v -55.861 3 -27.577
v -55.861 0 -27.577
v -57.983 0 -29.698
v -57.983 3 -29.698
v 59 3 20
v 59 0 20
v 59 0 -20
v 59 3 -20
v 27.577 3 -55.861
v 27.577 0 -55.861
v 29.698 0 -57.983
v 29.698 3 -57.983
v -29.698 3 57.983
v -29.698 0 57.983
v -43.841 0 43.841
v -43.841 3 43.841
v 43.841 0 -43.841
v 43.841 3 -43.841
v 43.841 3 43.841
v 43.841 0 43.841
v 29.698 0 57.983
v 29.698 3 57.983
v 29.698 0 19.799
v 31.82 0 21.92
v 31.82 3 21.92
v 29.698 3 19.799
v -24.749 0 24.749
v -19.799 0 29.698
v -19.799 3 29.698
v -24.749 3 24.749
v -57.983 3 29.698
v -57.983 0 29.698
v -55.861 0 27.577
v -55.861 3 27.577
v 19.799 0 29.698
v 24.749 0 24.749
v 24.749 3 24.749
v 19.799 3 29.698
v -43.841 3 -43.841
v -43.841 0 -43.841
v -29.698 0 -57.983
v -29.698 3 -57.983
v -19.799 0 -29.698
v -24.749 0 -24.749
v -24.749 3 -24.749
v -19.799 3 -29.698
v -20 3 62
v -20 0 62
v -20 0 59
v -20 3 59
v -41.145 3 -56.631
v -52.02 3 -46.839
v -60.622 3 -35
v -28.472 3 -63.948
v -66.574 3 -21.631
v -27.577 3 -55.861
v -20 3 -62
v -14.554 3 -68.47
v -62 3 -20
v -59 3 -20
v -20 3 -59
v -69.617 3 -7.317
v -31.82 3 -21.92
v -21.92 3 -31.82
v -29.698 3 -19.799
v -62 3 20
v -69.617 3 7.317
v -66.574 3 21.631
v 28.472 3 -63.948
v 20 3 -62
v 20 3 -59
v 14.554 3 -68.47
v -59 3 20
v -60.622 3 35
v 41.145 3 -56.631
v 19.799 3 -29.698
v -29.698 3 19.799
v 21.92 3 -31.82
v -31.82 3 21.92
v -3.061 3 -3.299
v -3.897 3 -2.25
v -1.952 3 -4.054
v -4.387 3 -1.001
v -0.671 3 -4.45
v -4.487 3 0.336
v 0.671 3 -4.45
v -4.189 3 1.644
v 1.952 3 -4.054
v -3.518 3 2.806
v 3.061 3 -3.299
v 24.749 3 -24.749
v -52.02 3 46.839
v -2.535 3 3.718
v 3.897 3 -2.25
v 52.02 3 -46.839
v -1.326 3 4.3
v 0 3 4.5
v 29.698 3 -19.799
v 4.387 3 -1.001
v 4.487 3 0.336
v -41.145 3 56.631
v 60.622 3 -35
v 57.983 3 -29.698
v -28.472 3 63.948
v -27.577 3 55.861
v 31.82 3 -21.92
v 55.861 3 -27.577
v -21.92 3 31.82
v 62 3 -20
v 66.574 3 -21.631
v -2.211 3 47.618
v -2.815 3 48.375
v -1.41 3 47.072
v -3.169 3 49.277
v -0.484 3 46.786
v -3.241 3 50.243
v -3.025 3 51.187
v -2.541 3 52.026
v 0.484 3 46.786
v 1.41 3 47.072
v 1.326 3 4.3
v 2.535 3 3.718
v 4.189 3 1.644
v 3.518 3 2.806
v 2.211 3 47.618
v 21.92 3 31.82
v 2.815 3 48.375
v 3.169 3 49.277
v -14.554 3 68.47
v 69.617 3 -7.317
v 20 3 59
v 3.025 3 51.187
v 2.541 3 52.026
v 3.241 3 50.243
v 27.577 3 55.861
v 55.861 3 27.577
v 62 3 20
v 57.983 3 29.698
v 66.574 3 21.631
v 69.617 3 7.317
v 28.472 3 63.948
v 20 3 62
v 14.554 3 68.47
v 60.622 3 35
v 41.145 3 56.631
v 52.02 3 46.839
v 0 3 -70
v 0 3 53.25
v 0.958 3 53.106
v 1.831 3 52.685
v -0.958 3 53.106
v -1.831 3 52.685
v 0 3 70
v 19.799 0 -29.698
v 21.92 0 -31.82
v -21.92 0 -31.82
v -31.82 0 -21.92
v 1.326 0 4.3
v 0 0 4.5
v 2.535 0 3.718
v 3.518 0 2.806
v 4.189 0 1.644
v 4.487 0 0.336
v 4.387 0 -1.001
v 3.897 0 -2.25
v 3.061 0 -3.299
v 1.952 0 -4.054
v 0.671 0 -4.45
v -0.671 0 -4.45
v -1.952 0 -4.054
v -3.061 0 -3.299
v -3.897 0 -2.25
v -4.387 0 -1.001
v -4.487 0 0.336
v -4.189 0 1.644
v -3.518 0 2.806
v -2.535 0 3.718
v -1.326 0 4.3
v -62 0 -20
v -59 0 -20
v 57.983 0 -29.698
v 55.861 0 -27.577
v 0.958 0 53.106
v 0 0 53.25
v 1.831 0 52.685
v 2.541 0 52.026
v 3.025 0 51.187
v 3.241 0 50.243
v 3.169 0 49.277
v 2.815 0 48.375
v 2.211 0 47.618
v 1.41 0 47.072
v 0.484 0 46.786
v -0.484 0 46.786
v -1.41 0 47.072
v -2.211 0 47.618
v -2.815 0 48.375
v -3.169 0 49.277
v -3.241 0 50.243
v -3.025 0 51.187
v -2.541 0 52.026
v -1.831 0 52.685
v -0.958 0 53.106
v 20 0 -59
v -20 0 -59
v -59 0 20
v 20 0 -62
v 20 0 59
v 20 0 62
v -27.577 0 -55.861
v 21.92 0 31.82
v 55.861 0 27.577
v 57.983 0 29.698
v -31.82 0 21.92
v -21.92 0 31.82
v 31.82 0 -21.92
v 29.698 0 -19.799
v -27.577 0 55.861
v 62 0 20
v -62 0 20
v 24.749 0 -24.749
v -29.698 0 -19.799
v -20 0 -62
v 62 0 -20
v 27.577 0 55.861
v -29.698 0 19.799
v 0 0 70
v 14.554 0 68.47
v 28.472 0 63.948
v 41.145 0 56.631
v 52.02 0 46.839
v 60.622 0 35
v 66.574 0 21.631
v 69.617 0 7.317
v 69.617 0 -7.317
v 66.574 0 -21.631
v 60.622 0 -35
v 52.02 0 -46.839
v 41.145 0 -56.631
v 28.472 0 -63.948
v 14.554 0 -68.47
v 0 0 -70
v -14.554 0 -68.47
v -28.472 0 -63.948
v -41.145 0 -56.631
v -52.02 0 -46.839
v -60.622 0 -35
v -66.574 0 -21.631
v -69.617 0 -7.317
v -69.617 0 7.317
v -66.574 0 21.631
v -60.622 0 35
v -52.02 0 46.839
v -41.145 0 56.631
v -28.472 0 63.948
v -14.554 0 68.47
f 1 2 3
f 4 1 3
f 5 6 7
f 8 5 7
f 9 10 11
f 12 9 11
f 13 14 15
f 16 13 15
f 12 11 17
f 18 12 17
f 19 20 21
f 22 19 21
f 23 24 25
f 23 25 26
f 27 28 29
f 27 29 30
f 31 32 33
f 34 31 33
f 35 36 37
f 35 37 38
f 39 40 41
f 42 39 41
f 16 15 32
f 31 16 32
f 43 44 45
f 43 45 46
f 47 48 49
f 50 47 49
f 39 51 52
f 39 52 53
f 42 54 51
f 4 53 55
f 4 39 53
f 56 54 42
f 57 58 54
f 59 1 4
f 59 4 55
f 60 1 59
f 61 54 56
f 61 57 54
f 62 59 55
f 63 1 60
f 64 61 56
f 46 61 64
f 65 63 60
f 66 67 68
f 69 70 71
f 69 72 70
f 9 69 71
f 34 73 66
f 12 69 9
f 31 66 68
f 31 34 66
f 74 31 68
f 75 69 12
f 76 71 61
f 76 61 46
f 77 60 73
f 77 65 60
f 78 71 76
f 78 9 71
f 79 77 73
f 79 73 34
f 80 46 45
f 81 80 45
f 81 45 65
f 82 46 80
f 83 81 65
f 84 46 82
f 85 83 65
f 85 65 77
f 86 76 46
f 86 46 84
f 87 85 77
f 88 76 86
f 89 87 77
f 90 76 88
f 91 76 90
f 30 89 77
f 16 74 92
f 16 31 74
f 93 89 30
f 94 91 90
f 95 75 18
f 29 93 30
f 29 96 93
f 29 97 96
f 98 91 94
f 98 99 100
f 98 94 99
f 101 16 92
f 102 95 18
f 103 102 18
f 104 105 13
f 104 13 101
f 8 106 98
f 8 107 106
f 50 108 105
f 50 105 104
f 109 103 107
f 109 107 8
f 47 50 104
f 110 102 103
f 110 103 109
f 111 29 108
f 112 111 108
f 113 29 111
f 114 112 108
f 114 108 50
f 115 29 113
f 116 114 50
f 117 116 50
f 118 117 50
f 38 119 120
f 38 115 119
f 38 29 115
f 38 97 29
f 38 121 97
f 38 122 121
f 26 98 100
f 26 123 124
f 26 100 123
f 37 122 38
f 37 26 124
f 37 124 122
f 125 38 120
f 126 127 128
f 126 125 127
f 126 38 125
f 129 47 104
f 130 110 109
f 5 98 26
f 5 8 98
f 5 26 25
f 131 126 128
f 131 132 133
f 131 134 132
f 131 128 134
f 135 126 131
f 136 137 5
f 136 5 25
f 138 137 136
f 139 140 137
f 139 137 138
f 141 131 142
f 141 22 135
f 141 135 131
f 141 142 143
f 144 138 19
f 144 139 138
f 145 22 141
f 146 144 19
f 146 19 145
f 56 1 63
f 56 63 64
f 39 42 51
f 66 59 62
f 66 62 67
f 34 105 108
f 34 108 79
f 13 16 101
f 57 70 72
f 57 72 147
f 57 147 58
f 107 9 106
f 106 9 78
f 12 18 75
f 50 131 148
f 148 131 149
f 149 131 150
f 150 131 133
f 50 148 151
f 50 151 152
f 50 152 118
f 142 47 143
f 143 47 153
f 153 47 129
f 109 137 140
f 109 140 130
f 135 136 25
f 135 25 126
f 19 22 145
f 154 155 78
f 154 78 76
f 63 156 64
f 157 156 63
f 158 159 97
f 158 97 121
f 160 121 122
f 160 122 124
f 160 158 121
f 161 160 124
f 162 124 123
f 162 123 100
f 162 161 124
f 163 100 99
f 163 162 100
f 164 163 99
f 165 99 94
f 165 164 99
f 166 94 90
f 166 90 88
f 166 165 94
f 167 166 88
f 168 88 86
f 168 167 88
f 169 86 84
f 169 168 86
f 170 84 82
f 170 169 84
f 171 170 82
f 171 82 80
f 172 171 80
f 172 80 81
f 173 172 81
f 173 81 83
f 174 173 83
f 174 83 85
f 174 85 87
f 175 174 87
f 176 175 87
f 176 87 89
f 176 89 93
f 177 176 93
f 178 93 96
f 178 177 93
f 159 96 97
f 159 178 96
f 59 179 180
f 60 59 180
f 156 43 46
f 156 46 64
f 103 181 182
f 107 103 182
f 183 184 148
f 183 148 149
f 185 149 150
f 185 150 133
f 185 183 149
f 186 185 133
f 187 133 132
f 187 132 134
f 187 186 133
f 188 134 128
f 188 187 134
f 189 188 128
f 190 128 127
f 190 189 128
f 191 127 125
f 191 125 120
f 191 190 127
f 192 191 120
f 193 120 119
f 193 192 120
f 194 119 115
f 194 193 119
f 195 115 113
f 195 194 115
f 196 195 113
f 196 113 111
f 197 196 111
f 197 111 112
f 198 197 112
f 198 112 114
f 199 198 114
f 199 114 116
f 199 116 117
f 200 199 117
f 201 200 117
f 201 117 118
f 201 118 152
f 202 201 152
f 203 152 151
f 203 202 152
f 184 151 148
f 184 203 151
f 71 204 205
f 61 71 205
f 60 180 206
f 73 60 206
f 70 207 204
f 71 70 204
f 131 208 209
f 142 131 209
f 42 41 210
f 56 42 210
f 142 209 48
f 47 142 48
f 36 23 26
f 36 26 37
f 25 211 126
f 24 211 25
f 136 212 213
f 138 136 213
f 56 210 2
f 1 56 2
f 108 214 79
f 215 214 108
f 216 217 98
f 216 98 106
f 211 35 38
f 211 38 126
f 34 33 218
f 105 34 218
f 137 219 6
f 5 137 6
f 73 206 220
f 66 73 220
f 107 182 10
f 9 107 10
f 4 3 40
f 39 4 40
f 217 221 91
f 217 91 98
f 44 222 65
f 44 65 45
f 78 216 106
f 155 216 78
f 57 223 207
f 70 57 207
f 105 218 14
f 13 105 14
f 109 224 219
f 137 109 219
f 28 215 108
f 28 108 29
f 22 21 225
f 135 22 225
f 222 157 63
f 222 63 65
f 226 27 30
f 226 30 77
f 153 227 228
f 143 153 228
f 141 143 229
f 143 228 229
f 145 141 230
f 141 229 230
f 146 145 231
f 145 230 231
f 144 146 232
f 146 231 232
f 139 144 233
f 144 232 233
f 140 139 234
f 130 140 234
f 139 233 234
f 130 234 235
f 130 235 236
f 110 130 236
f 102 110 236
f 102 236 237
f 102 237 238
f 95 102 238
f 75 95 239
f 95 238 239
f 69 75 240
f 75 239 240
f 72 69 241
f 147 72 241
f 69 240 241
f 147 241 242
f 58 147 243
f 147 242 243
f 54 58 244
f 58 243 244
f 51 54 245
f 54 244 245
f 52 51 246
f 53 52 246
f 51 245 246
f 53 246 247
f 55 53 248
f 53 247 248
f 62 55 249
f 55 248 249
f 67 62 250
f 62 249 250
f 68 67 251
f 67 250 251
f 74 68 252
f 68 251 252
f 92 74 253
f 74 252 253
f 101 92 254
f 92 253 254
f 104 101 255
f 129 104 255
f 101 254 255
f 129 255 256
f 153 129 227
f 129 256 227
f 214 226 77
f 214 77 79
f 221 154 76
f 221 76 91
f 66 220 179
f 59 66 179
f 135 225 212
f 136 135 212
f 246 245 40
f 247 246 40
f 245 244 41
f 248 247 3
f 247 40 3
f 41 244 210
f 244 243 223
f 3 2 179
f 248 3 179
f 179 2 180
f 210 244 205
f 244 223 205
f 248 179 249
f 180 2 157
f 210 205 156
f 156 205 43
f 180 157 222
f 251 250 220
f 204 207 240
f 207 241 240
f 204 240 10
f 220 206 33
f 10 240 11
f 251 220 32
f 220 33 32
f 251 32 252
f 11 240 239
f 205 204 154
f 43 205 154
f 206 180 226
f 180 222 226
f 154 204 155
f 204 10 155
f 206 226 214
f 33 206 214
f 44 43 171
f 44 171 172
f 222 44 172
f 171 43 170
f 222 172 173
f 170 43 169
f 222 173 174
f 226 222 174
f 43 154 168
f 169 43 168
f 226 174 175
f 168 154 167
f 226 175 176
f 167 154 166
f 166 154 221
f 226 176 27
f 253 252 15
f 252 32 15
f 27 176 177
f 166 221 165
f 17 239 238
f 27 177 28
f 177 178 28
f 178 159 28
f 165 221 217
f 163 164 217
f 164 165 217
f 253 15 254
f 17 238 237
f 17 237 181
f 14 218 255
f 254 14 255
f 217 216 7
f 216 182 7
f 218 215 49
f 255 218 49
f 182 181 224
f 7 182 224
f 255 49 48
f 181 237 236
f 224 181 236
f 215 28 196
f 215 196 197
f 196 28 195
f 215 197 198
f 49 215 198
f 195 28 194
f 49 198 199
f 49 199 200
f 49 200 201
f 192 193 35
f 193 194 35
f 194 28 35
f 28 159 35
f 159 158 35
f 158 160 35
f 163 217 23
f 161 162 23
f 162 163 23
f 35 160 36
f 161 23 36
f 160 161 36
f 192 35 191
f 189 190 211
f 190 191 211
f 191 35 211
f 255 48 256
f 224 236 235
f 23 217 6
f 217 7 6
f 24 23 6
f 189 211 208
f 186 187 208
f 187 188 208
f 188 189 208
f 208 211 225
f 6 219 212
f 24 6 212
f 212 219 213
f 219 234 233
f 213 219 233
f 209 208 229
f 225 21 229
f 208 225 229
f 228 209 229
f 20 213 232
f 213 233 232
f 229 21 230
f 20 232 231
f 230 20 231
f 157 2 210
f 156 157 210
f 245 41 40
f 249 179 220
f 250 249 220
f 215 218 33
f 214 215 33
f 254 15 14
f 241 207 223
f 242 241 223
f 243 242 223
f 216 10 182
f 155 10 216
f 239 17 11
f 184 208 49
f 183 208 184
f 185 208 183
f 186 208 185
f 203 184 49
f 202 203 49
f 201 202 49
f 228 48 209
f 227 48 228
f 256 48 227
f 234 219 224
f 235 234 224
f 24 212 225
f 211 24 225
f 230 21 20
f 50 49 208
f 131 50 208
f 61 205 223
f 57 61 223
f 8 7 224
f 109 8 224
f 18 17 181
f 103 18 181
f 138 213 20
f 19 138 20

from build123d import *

# Parameters (mm, degrees)
CROQUIS1_R              = 70
CROQUIS1_R_2            = 4.5
CROQUIS1_R_3            = 3.25
SALIENTE_EXTRUIR1_DEPTH = 3


with BuildPart() as part:
    # Croquis1 → Saliente-Extruir1 (new body)
    with BuildSketch(Plane(origin=(0, 0, 0), x_dir=(1, 0, 0), z_dir=(0, 1, 0))):
        with Locations(Location((0, 0, 0), (0, 0, 270))):
            Circle(CROQUIS1_R)
        with Locations(Location((0, 0, 0), (0, 0, 270))):
            Circle(CROQUIS1_R_2, mode=Mode.SUBTRACT)
        with Locations(Location((0, -50, 0), (0, 0, 270))):
            Circle(CROQUIS1_R_3, mode=Mode.SUBTRACT)
        Polygon((24.748737342, 24.748737342), (29.69848481, 19.798989873), (31.819805153, 21.920310217), (21.920310217, 31.819805153), (19.798989873, 29.69848481), align=None, mode=Mode.SUBTRACT)
        Polygon((24.748737342, -24.748737342), (19.798989873, -29.69848481), (21.920310217, -31.819805153), (31.819805153, -21.920310217), (29.69848481, -19.798989873), align=None, mode=Mode.SUBTRACT)
        Polygon((-24.748737342, 24.748737342), (-19.798989873, 29.69848481), (-21.920310217, 31.819805153), (-31.819805153, 21.920310217), (-29.69848481, 19.798989873), align=None, mode=Mode.SUBTRACT)
        Polygon((-24.748737342, -24.748737342), (-29.69848481, -19.798989873), (-31.819805153, -21.920310217), (-21.920310217, -31.819805153), (-19.798989873, -29.69848481), align=None, mode=Mode.SUBTRACT)
        Polygon((0, 62), (20, 62), (20, 59), (-20, 59), (-20, 62), align=None, mode=Mode.SUBTRACT)
        Polygon((55.861435714, 27.577164466), (27.577164466, 55.861435714), (29.69848481, 57.982756057), (43.840620434, 43.840620434), (57.982756057, 29.69848481), align=None, mode=Mode.SUBTRACT)
        Polygon((59, -20), (59, 20), (62, 20), (62, 0), (62, -20), align=None, mode=Mode.SUBTRACT)
        Polygon((27.577164466, -55.861435714), (55.861435714, -27.577164466), (57.982756057, -29.69848481), (43.840620434, -43.840620434), (29.69848481, -57.982756057), align=None, mode=Mode.SUBTRACT)
        Polygon((-20, -59), (20, -59), (20, -62), (0, -62), (-20, -62), align=None, mode=Mode.SUBTRACT)
        Polygon((-55.861435714, -27.577164466), (-27.577164466, -55.861435714), (-29.69848481, -57.982756057), (-43.840620434, -43.840620434), (-57.982756057, -29.69848481), align=None, mode=Mode.SUBTRACT)
        Polygon((-59, 20), (-59, -20), (-62, -20), (-62, 0), (-62, 20), align=None, mode=Mode.SUBTRACT)
        Polygon((-27.577164466, 55.861435714), (-55.861435714, 27.577164466), (-57.982756057, 29.69848481), (-43.840620434, 43.840620434), (-29.69848481, 57.982756057), align=None, mode=Mode.SUBTRACT)
    extrude(amount=SALIENTE_EXTRUIR1_DEPTH)


solid = part.part
